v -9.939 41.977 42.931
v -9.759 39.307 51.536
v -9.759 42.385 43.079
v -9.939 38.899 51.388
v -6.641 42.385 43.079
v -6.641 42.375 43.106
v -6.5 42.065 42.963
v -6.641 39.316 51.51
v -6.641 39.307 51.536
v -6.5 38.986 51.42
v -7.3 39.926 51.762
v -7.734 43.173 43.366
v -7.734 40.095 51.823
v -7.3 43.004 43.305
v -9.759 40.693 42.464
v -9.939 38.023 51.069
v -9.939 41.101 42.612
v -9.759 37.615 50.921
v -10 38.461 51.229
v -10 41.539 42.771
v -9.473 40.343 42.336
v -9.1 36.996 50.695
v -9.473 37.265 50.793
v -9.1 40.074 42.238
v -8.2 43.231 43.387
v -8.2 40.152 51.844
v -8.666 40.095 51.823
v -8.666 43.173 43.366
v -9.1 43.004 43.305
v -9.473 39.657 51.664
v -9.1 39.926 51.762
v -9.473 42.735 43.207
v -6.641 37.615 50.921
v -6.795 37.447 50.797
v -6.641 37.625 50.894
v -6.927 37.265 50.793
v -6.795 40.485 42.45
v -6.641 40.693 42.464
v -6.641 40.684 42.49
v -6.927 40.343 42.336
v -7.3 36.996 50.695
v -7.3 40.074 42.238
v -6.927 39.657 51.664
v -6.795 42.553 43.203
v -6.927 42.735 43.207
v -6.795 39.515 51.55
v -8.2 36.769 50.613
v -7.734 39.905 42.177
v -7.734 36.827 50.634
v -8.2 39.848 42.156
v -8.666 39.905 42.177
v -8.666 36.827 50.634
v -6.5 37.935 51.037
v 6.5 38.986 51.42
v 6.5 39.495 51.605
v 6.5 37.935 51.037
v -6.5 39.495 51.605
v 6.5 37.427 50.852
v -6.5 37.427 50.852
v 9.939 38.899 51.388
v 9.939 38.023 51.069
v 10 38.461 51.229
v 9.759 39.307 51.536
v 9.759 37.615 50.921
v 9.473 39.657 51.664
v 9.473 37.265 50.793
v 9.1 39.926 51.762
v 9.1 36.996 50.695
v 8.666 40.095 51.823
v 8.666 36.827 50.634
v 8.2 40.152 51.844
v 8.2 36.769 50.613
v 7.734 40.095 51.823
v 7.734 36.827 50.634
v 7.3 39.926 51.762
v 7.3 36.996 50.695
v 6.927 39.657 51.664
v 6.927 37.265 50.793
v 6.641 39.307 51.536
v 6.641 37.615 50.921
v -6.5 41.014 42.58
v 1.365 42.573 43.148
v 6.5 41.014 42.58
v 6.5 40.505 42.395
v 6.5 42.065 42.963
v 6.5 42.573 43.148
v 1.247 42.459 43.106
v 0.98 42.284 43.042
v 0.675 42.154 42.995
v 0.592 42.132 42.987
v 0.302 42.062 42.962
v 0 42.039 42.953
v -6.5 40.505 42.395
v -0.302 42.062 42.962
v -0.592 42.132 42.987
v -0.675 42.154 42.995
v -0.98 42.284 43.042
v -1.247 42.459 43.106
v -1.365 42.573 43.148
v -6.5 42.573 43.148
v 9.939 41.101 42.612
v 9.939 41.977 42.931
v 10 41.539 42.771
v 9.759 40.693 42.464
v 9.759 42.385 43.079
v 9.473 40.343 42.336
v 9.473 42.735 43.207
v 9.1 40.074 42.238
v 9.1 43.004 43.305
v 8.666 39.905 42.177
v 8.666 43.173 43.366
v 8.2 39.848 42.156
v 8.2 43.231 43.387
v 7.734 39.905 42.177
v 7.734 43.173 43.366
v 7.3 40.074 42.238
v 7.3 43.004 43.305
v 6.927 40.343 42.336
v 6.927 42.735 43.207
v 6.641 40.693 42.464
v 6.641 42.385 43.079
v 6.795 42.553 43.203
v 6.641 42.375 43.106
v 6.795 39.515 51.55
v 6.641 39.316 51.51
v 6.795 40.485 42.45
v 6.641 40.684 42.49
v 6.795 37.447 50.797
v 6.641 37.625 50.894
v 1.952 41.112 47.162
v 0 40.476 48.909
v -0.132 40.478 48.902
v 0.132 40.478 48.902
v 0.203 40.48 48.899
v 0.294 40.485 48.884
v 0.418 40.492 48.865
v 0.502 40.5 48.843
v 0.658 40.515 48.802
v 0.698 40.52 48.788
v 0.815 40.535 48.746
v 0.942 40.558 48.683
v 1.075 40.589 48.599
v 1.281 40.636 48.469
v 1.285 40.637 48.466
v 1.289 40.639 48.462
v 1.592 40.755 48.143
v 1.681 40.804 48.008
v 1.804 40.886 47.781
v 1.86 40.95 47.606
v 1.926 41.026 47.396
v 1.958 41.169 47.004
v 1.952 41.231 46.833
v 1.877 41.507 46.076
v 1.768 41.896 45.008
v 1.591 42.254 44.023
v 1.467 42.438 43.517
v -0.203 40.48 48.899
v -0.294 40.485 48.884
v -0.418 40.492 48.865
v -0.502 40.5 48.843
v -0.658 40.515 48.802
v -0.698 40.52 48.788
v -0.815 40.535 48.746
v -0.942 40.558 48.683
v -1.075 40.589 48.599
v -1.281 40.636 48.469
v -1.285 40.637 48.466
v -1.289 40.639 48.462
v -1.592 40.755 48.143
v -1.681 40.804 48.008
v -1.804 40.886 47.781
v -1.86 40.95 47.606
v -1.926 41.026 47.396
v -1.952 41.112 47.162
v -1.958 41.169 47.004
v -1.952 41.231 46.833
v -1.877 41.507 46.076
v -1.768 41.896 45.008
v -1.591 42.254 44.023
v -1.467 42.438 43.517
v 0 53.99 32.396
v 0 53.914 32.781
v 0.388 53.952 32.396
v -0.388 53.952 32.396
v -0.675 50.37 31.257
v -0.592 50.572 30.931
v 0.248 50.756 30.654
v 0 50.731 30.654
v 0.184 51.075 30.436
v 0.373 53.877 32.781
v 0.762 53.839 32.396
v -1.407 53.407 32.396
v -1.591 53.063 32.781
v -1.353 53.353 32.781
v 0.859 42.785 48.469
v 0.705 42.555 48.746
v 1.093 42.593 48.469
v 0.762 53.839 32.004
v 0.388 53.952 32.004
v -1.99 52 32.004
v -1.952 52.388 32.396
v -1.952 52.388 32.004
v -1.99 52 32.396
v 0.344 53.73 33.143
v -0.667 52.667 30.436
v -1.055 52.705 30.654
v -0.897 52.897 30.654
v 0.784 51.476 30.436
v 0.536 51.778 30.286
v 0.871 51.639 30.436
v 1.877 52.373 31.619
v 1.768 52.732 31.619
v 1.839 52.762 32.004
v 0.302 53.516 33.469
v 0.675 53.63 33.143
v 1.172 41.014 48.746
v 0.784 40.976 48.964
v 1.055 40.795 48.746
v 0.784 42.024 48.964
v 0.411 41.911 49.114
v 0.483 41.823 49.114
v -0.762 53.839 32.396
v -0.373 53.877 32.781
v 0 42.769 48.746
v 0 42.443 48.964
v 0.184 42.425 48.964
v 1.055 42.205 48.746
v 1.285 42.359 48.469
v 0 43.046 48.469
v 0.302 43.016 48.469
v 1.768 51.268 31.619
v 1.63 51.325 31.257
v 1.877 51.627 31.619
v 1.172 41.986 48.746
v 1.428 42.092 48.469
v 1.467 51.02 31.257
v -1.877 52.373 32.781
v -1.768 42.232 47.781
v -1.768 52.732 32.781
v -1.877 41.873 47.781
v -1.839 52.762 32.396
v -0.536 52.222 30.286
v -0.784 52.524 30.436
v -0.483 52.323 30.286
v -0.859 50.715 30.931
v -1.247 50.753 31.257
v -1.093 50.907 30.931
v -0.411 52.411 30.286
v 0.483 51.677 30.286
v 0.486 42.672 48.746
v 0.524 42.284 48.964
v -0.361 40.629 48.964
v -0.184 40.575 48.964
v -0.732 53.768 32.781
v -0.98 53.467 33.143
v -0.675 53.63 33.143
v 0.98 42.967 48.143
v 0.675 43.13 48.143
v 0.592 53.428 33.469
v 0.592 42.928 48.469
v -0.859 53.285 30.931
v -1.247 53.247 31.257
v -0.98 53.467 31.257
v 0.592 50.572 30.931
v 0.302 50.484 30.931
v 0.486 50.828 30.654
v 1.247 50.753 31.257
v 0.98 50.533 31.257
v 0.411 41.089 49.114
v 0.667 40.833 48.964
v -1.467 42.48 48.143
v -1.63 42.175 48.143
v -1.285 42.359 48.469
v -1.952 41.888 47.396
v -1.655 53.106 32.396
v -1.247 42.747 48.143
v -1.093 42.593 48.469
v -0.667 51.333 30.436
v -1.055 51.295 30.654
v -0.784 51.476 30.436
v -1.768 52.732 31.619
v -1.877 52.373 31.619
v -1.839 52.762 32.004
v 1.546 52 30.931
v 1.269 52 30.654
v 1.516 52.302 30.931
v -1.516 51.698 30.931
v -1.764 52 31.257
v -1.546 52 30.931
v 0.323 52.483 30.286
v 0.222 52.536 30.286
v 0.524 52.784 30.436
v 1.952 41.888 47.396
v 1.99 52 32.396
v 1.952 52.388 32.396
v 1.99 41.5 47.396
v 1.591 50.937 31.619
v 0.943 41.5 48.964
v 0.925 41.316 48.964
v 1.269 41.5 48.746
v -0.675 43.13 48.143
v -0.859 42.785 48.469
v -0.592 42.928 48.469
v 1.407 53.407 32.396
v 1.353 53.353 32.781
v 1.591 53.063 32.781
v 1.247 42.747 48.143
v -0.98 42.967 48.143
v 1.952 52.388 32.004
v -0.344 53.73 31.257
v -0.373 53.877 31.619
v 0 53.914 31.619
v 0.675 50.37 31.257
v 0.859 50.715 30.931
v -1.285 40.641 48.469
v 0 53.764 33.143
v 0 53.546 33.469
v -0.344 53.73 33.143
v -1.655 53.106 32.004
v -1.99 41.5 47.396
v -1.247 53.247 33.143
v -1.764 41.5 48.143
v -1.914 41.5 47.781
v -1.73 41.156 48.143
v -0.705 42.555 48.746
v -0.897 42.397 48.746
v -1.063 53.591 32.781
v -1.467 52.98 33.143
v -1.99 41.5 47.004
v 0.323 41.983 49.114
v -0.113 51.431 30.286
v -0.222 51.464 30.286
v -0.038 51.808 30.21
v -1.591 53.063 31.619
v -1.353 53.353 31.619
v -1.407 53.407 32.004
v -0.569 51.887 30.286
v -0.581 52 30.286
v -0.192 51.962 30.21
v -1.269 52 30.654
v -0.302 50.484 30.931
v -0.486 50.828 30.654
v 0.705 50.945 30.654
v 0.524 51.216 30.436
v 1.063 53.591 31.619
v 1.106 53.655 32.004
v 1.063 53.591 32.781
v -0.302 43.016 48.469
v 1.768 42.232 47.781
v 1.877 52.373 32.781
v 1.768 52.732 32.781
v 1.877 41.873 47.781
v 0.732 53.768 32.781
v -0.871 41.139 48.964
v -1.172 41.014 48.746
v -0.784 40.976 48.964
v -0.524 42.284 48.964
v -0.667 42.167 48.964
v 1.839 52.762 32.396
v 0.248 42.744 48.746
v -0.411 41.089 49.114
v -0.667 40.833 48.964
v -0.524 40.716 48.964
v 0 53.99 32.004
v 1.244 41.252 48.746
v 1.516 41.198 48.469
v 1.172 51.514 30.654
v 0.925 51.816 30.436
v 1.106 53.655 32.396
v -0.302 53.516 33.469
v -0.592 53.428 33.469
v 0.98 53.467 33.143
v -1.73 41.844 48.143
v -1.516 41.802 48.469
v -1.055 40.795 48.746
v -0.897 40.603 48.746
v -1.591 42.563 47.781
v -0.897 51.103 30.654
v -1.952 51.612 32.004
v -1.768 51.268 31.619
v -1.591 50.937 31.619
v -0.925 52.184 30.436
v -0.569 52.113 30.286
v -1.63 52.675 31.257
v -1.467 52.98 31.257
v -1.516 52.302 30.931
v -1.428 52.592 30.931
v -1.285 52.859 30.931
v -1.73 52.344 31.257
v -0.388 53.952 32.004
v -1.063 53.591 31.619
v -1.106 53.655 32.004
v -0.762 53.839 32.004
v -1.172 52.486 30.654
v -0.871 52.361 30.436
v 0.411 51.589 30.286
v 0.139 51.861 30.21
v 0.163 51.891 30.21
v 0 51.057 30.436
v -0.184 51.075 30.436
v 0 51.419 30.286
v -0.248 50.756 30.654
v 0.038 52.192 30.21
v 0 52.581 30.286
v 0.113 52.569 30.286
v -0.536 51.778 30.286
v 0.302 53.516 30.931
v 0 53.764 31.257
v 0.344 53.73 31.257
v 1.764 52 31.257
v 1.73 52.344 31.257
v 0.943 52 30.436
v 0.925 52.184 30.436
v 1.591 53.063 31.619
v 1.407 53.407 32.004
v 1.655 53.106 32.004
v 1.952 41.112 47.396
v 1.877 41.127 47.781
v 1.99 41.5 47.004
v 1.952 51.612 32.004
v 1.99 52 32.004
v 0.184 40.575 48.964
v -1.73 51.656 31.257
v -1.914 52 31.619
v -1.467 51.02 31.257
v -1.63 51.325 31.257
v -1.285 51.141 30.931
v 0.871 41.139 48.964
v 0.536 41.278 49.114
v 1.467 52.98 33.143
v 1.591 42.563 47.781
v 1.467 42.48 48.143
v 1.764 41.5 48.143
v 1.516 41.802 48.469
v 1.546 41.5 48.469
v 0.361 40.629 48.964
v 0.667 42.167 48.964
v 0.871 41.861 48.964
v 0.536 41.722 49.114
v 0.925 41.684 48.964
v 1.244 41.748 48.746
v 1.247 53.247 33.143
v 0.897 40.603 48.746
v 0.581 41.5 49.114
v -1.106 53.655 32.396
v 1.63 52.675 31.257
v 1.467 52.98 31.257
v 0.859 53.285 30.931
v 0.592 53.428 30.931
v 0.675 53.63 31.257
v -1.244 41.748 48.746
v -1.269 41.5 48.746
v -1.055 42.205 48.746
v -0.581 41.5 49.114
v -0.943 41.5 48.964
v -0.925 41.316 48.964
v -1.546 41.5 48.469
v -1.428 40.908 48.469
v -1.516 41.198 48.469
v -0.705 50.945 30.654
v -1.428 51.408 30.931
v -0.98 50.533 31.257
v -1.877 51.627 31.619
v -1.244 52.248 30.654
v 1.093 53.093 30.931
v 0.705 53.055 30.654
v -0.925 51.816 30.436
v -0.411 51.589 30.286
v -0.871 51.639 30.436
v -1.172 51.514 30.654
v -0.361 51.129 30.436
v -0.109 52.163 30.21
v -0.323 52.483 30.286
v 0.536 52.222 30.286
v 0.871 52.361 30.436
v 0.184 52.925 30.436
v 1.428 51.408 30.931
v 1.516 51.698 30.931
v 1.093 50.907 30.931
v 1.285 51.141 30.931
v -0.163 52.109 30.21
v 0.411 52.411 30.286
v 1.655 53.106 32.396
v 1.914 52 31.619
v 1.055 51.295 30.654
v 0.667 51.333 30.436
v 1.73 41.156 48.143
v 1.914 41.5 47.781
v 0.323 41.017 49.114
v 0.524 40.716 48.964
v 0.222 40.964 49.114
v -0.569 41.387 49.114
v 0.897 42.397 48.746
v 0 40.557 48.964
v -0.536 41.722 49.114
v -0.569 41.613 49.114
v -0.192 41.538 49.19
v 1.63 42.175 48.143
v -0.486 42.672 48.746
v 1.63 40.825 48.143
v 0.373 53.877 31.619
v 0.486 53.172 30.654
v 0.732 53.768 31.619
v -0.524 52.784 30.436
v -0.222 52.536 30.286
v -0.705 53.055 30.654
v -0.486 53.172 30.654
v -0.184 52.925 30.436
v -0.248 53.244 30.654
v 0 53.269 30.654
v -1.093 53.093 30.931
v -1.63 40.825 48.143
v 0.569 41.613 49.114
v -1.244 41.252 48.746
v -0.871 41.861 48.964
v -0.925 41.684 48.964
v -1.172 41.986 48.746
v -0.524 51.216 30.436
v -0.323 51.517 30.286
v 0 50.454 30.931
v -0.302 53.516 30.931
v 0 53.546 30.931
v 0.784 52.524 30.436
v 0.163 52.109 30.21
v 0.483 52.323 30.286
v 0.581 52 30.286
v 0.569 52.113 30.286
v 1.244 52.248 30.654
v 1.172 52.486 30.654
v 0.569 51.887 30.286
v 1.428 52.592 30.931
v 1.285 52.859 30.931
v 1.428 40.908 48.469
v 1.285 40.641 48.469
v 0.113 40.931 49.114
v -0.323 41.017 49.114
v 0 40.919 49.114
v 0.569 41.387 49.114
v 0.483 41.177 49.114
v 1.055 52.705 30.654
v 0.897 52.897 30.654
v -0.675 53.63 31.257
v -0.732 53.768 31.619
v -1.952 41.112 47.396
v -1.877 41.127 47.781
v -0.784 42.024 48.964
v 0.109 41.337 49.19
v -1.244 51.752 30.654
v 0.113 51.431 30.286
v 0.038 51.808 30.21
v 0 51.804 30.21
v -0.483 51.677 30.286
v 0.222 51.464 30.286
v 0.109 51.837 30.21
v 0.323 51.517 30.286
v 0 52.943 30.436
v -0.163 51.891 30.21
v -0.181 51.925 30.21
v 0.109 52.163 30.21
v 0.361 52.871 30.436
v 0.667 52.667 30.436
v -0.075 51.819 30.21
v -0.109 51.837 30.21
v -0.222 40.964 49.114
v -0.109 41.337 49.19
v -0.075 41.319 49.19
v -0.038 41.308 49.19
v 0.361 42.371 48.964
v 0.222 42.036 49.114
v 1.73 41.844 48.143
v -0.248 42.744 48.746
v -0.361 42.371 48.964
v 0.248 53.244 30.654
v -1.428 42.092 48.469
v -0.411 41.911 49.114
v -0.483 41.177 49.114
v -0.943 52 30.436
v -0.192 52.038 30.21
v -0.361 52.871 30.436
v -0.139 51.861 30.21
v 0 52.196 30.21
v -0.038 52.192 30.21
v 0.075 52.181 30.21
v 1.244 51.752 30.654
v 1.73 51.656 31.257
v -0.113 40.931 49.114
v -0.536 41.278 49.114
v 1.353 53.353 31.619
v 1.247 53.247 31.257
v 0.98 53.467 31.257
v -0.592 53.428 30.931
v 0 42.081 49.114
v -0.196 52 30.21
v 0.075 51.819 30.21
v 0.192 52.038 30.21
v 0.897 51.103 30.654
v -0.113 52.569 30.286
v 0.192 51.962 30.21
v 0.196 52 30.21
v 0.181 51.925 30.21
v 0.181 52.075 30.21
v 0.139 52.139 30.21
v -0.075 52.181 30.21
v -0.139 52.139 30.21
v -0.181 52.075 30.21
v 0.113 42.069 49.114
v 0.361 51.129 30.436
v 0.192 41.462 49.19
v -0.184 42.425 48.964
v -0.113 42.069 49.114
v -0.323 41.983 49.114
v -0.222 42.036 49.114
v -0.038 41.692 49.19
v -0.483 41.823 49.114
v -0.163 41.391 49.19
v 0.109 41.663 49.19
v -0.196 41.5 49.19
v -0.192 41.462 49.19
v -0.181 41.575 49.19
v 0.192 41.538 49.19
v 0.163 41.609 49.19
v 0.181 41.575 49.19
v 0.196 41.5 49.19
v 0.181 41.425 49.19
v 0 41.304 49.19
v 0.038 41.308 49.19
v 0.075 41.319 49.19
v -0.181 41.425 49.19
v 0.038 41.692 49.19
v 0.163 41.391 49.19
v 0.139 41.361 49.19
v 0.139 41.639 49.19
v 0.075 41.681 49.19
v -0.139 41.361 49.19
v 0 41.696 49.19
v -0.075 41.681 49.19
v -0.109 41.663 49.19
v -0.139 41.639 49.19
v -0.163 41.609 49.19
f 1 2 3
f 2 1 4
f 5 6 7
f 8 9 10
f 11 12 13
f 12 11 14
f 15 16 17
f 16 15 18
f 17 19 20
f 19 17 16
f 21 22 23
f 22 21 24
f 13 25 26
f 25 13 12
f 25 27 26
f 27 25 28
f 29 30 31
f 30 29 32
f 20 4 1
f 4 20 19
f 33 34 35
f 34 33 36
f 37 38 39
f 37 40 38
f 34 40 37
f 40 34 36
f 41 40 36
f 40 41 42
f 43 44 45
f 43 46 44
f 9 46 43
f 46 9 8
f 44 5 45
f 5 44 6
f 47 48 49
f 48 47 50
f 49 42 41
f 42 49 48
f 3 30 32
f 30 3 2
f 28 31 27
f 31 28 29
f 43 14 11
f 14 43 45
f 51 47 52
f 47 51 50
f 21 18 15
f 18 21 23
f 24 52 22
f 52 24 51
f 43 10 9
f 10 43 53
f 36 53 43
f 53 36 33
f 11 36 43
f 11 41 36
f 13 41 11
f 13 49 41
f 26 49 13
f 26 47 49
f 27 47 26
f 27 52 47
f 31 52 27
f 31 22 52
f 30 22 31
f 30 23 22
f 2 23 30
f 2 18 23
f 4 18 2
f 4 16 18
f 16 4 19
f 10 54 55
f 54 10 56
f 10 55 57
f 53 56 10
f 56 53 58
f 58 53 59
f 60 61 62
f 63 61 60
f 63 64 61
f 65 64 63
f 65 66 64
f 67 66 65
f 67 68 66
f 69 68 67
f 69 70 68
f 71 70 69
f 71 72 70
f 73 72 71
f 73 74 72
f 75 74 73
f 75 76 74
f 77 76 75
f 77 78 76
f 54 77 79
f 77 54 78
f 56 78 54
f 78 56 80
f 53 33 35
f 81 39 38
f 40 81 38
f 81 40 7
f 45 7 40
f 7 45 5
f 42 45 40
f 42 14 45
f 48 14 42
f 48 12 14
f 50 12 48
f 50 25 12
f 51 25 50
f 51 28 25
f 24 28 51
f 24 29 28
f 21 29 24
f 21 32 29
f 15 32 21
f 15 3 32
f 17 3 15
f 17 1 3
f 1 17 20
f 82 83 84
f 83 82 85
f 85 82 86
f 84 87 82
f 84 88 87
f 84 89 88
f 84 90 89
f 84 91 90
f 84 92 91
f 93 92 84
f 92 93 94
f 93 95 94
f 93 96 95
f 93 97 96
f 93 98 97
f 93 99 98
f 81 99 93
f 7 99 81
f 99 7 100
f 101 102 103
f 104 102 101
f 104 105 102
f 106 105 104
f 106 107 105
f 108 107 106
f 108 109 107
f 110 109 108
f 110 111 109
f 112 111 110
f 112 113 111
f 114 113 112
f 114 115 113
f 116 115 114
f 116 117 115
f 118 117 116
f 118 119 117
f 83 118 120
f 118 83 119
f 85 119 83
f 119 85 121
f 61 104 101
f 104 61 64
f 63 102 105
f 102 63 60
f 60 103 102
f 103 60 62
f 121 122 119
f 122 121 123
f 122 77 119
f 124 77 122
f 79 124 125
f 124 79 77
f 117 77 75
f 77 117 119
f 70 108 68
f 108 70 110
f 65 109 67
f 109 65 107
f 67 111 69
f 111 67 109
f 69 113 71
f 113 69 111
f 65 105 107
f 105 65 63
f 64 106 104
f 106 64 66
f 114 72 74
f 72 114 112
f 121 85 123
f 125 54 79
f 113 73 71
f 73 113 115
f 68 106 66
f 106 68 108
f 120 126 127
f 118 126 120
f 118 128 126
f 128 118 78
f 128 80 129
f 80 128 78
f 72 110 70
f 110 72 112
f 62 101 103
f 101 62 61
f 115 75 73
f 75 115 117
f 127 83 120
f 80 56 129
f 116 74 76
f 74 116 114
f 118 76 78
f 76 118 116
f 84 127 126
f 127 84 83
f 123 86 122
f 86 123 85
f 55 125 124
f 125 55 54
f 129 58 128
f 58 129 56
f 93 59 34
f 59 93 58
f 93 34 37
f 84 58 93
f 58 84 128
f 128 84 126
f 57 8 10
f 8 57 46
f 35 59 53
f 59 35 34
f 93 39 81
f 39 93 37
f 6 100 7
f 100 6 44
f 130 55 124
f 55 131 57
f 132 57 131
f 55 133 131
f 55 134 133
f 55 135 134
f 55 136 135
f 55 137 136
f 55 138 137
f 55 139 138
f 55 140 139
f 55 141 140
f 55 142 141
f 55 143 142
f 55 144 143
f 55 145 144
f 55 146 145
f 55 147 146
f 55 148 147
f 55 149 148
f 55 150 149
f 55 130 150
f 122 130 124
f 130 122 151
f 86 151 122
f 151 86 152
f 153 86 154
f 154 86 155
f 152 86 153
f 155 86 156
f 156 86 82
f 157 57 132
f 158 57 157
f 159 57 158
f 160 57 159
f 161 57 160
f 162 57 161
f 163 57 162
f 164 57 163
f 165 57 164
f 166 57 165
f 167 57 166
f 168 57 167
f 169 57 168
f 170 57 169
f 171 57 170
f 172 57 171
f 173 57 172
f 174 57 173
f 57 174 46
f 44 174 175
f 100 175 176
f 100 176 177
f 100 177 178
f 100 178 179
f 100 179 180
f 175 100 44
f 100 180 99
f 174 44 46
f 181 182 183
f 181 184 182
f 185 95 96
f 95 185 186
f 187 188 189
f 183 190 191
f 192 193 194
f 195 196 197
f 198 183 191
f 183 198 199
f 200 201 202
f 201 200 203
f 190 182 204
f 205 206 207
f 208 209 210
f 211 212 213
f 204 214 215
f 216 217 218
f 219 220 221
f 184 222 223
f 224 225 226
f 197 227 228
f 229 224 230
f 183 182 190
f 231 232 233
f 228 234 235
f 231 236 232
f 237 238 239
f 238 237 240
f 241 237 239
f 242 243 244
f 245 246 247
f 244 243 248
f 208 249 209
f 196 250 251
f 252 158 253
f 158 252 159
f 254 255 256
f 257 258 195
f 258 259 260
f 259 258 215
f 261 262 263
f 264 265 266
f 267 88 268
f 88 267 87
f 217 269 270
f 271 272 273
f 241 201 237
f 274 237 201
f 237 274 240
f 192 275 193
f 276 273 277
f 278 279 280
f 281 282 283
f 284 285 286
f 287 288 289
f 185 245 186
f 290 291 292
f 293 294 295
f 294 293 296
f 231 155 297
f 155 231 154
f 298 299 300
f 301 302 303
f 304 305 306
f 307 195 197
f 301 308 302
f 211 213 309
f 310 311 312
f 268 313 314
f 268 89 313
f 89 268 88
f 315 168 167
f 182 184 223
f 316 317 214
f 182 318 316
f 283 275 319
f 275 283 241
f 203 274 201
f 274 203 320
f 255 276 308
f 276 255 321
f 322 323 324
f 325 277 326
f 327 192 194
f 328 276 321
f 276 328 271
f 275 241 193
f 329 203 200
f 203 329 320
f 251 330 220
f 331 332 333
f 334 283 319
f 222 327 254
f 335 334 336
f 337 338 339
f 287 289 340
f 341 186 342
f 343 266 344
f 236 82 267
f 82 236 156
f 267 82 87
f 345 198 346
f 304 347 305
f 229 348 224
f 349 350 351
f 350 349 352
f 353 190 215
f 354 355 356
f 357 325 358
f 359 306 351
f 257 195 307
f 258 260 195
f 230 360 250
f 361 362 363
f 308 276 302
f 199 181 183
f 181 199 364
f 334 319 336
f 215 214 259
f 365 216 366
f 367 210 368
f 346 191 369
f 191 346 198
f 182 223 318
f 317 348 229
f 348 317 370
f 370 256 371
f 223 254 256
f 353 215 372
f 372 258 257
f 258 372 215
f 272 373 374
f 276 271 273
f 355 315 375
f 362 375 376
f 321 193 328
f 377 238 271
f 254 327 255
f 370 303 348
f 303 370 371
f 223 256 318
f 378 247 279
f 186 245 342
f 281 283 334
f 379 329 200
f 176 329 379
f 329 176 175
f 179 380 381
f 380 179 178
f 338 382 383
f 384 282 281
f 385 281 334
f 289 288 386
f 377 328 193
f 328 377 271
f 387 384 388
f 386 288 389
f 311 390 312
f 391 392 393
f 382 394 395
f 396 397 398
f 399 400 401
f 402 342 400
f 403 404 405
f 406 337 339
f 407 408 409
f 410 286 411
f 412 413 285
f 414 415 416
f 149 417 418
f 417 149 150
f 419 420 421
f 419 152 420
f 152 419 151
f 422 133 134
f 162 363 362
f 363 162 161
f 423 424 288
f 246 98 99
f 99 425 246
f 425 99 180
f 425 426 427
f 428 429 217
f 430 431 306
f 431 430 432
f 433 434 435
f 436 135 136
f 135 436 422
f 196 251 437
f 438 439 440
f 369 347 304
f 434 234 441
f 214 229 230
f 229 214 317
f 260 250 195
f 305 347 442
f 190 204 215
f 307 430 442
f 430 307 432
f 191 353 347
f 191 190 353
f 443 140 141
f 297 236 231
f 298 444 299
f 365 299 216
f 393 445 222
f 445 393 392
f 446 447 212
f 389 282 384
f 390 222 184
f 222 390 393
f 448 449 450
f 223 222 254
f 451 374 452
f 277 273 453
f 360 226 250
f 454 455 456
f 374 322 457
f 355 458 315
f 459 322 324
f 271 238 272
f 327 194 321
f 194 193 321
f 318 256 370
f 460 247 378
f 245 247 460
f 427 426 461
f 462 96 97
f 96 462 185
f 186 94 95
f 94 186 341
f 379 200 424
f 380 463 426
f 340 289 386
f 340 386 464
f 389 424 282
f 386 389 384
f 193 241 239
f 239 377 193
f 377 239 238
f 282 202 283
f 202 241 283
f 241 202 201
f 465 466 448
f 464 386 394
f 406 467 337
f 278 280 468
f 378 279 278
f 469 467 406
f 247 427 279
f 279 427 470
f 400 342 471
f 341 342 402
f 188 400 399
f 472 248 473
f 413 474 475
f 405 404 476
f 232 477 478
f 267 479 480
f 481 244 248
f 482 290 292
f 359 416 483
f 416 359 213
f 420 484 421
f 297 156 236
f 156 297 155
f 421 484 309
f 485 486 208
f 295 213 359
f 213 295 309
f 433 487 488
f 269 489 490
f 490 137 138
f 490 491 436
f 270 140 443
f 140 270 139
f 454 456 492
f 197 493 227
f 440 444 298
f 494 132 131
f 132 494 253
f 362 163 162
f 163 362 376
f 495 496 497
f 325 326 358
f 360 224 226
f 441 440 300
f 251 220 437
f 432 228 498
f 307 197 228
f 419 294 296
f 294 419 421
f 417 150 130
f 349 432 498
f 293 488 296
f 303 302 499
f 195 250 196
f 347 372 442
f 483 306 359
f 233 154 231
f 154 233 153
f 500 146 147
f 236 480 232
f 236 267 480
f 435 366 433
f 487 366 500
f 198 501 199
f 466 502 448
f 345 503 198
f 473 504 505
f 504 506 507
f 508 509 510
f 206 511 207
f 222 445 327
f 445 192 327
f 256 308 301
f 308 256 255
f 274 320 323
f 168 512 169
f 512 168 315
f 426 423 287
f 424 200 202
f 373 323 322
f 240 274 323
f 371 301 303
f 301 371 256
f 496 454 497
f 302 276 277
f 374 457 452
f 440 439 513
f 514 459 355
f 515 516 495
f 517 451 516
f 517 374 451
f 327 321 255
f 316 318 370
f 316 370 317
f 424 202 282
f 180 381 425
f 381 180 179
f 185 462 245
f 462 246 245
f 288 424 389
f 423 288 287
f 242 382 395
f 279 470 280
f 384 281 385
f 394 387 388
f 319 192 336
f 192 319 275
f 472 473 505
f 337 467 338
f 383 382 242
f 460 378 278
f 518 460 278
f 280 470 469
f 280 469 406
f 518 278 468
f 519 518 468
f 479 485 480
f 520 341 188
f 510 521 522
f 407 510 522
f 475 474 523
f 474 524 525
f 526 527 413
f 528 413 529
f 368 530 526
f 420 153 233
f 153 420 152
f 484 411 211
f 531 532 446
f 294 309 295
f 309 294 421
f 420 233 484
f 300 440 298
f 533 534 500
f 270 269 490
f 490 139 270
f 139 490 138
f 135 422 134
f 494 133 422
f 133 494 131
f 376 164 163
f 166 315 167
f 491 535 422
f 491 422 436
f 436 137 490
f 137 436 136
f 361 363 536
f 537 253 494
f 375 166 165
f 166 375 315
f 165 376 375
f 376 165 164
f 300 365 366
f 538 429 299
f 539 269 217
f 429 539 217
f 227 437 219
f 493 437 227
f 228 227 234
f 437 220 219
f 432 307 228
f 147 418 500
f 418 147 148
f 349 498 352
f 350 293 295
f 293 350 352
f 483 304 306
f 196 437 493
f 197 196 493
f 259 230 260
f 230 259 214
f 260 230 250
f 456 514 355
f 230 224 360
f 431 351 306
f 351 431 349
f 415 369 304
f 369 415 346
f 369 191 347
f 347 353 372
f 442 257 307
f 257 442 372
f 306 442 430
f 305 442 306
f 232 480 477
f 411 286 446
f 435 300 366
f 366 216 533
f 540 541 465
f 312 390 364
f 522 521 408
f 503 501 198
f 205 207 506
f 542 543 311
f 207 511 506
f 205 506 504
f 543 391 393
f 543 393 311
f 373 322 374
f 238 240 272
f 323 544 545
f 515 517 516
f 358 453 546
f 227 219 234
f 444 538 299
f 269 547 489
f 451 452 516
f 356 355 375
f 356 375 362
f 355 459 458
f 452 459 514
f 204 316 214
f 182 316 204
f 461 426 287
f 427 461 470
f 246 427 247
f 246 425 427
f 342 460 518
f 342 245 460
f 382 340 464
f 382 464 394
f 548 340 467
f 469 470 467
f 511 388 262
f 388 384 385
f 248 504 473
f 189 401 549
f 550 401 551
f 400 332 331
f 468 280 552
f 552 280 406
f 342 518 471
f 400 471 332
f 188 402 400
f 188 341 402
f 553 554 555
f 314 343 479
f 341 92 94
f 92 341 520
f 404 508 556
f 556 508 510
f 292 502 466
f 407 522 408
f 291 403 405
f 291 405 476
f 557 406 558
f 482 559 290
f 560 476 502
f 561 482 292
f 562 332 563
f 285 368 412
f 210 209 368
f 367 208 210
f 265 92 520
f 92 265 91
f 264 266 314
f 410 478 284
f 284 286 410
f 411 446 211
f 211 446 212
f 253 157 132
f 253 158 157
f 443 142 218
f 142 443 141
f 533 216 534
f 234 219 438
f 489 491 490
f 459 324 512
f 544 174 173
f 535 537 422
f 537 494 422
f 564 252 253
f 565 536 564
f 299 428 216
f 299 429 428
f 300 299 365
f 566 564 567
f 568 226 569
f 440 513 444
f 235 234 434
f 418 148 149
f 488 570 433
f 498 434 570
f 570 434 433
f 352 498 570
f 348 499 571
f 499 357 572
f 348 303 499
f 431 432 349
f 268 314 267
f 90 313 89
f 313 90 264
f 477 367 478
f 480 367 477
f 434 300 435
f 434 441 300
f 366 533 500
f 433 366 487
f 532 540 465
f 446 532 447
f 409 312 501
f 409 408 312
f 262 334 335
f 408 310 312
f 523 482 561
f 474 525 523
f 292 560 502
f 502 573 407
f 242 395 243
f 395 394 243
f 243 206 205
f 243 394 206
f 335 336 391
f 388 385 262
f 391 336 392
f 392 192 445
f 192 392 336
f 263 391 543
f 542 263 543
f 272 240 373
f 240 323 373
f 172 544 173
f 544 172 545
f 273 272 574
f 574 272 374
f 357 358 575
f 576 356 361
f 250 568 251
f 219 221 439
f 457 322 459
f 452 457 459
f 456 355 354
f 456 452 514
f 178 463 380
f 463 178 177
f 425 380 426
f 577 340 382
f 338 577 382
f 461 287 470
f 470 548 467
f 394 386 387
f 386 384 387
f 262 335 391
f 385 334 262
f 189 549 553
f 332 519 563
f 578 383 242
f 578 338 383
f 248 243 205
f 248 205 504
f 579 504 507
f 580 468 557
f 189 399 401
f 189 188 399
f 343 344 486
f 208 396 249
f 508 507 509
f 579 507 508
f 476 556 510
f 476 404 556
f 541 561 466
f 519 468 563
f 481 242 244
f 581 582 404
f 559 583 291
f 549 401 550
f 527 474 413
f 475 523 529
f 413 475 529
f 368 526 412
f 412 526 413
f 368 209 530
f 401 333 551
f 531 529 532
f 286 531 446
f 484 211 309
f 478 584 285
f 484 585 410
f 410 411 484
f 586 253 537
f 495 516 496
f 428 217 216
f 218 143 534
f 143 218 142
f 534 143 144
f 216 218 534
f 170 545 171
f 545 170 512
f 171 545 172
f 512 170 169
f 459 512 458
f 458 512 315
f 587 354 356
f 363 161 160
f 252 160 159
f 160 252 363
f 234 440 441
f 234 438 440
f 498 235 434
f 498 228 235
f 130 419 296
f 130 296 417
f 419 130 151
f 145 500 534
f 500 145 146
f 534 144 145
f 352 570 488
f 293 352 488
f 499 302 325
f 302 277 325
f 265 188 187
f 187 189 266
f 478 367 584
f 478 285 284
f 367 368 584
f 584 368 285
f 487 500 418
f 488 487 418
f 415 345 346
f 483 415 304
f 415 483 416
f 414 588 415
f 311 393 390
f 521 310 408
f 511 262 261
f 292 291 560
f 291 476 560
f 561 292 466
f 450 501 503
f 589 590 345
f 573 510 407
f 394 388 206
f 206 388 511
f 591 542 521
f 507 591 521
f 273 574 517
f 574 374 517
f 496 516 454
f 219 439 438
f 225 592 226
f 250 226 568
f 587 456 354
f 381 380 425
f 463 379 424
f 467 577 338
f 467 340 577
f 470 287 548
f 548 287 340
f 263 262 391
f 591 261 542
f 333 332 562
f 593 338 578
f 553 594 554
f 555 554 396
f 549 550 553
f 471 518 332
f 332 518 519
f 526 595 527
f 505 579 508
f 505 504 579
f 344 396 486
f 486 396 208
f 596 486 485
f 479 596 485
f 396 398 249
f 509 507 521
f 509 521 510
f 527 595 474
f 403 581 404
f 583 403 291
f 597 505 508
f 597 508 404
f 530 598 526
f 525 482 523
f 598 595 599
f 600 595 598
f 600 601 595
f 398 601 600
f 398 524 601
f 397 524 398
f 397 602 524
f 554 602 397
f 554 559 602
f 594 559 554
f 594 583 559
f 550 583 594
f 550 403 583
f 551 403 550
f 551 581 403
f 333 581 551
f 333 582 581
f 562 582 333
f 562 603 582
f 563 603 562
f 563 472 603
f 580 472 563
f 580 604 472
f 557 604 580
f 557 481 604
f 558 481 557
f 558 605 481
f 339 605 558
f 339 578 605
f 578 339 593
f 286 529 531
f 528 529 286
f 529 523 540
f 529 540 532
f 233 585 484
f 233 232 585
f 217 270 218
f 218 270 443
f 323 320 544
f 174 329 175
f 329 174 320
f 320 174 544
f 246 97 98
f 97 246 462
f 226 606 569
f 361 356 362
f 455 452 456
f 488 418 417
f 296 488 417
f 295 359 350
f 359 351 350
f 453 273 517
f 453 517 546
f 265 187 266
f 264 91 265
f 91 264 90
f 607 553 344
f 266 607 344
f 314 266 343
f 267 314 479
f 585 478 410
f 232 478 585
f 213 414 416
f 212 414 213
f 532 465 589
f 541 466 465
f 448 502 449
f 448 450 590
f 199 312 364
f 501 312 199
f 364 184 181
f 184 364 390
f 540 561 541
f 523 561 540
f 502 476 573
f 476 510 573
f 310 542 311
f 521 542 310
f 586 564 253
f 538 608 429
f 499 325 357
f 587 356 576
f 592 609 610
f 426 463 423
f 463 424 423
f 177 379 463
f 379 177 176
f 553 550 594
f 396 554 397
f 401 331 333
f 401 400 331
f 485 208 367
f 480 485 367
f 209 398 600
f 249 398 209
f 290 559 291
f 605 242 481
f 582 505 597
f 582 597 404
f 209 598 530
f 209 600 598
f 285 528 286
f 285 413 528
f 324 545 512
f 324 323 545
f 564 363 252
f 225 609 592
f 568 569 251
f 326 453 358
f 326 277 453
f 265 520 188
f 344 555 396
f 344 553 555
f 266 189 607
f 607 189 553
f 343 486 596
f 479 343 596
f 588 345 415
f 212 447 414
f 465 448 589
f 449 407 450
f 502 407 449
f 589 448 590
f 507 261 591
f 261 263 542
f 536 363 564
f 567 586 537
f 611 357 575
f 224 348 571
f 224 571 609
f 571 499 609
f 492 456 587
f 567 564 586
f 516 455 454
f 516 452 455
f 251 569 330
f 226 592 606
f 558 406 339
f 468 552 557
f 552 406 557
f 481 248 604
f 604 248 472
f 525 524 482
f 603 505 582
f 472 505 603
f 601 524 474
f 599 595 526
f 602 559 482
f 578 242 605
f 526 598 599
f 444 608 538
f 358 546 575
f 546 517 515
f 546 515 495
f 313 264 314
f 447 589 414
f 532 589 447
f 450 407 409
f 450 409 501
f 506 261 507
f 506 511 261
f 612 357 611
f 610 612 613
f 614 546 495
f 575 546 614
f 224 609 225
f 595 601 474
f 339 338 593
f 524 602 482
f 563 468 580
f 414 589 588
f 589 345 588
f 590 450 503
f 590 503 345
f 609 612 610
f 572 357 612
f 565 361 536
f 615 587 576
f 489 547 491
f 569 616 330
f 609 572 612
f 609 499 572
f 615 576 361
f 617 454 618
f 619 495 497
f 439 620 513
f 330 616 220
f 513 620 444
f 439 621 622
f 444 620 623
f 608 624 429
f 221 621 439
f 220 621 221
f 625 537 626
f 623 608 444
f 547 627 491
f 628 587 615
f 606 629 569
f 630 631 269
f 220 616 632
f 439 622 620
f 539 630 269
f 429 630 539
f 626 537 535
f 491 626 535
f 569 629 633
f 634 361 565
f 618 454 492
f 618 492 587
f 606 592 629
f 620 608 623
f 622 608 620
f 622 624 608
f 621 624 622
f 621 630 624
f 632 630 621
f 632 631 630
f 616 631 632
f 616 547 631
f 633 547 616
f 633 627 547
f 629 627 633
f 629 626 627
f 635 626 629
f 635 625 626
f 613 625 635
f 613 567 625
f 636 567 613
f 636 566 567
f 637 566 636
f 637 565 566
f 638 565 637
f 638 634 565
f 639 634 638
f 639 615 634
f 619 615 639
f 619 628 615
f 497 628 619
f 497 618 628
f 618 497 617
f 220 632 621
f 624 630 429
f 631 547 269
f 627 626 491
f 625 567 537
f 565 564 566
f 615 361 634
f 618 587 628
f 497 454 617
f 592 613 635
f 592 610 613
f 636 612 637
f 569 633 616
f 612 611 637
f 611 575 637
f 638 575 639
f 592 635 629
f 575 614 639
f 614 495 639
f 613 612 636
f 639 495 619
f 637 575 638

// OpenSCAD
// file: ../lib.scad
// ===== 공용 프리미티브 (params 의존 없음 — use로 포함. 함정 1) =====

// 두 점을 잇는 캡슐. 끝단이 od/2 만큼 뻗는다 (함정 3)
module rod(p1, p2, od, fn = 56)
    hull() { translate(p1) sphere(d = od, $fn = fn);
             translate(p2) sphere(d = od, $fn = fn); }

function mir(p, s = 1) = [s * p.x, p.y, p.z];

// --- 라운디드 사각 2D 폴리곤 (CCW) ---
function arc_pt(cx, cy, r, a) = [cx + r * cos(a), cy + r * sin(a)];
function rrpts(w, h, r, n = 4) =
    let (x = w / 2 - r, y = h / 2 - r)
    concat(
        [for (i = [0:n]) arc_pt( x, -y, r, -90 + 90 * i / n)],
        [for (i = [0:n]) arc_pt( x,  y, r,   0 + 90 * i / n)],
        [for (i = [0:n]) arc_pt(-x,  y, r,  90 + 90 * i / n)],
        [for (i = [0:n]) arc_pt(-x, -y, r, 180 + 90 * i / n)]);

// y 위치의 XZ 단면 슬래브 (중심 x0/zc, 폭 w/높이 h, 모서리 r).
// 회전 매핑: 2D x→차량 X, 2D y→차량 Z, 돌출 +z→−Y (y..y+0.02 전방 전용, 함정 20)
module slabr(y, x0, w, h, zc, r)
    translate([x0, y + 0.02, zc]) rotate([90, 0, 0])
        linear_extrude(0.02) polygon(rrpts(w, h, r));

// 단면 체인 loft: sec = [[y, x0, w, h, zc, r], ...]
module loftr(sec)
    for (i = [0 : len(sec) - 2])
        hull() {
            slabr(sec[i][0],     sec[i][1],     sec[i][2],     sec[i][3],     sec[i][4],     sec[i][5]);
            slabr(sec[i + 1][0], sec[i + 1][1], sec[i + 1][2], sec[i + 1][3], sec[i + 1][4], sec[i + 1][5]);
        }

// 라운디드 박스 (z0..z1 수직, 평면 모서리 r)
module rbox(xc, yc, z0, z1, dx, dy, r, fn = 32)
    hull() for (px = [-1, 1], py = [-1, 1])
        translate([xc + px * (dx / 2 - r), yc + py * (dy / 2 - r), z0])
            cylinder(r = r, h = z1 - z0, $fn = fn);

// --- NACA 계열 에어포일 (LE 원점, 2D +x = 현 방향) ---
function _yt(x, c, t) = 5 * t * c * (0.2969*sqrt(x) - 0.1260*x - 0.3516*x*x
    + 0.2843*x*x*x - 0.1036*x*x*x*x);
function _yc(x, c, m) = 4 * m * c * x * (1 - x);
function naca_pts(c, t, m, n = 12) =
    concat(
        [for (i = [0:n])     let (x = i / n)     [x*c,  _yt(x, c, t) + _yc(x, c, m)]],
        [for (i = [n-1:-1:0]) let (x = i / n)    [x*c, -_yt(x, c, t) + _yc(x, c, m)]]);

// 슬라이스 3D 링: v=[x, yle, zle, c, aoa, th, cam] → 받각 회전된 naca 점의 링
// (th/cam은 mm — 현 대비 비율로 정규화)
function wring(v, n = 12) =
    let (c = v[3], t = v[5] / c, m = v[6] / c, pts = naca_pts(c, t, m, n),
         ca = cos(v[4]), sa = sin(v[4]))
    // 코드 방향 (ca,sa) + 두께/캠버 수직 방향 (-sa,ca) — 2D y 누락 금지
    [for (p = pts) [v[0], v[1] + p[0] * ca - p[1] * sa, v[2] + p[0] * sa + p[1] * ca]];

// 진짜 로프트 윙 — polyhedron 스트립. hull 체인은 캠버진 하면을 볼록 껍질로
// 채워(LE→TE 직선 웨지) 요소가 처지므로 쓰지 않는다
module wing3(sl, n = 12) {
    rings = [for (v = sl) wring(v, n)];
    ns = len(rings);
    m = len(rings[0]);
    pts = [for (r = rings, p = r) p];
    function ix(i, k) = i * m + (k % m);
    faces = concat(
        // 측면 스트립 (사중면 → 삼각형 2) — 외향 노멀 권선(캡과 일치)
        [for (i = [0 : ns - 2], k = [0 : m - 1])
            each [[ix(i, k), ix(i, k + 1), ix(i + 1, k + 1)],
                  [ix(i, k), ix(i + 1, k + 1), ix(i + 1, k)]]],
        // 끝 캡 (링은 단순 폴리곤 — 팬 삼각분할)
        [for (k = [1 : m - 2]) [ix(0, 0), ix(0, k + 1), ix(0, k)]],
        [for (k = [1 : m - 2]) [ix(ns - 1, 0), ix(ns - 1, k), ix(ns - 1, k + 1)]]
    );
    polyhedron(points = pts, faces = faces, convexity = 4);
}

// 반쪽 슬라이스 → x-대칭 전체. 규약: half는 센터(x=0)→팁 순서(내림차순 x).
// 결과는 x 오름차순 체인. x=0 센터만 중복 제외 (그 외 전부 미러)
function wsym(half) =
    concat([for (i = [len(half) - 1 : -1 : 0]) half[i]],
           [for (i = [0 : len(half) - 1]) if (abs(half[i][0]) > 1e-9)
               concat([-half[i][0]], [for (j = [1 : len(half[i]) - 1]) half[i][j]])]);

// 환(링), 축 Z
module ann(r_in, r_out, h, fn = 96)
    difference() { cylinder(r = r_out, h = h, center = true, $fn = fn);
                   cylinder(r = r_in,  h = h + 2, center = true, $fn = fn); }

// 리스트 전체 x반전+순서 역행 (센터 구간 없는 플랩 등 — 좌우 별도 wing3 호출용).
// x반전만 하면 행렬식이 음수가 되어 권선이 뒤집힌다 → 순서 역행으로 상쇄
function msym(half) =
    [for (i = [len(half) - 1 : -1 : 0])
        concat([-half[i][0]], [for (j = [1 : len(half[i]) - 1]) half[i][j]])];
// file: ../params.scad
// =====================================================================
// F1 그랜드파이언스 카 1:10 — 전체 파라미터 (유일한 수정 지점)
// 좌표계: +Y 전방, +X 좌측, +Z 상방, 지면 z=0, 원점=휠베이스 중심
// 전장 558 (y -268..+278), 전폭 194, 휠베이스 360, 타이어 OD 72 (720mm)
// 30부품. loftr 단면 = [y, x0, w, h, zc, r] (XZ 단면, y..y+0.02 슬래브)
// wing3 슬라이스 = [x, yle, zle, c, aoa, th, cam]
//   aoa: 현 방향의 X축 회전각. 전방 받각 요소는 165~170 (TE가 뒤+위)
// =====================================================================
$fn = 96;

// -- 휠/액슬 (실차 720mm 타이어, 18인치 림, 트랙 F1600/R1550) --
AXF_Y = 180;   AXR_Y = -180;
WHF_X = 80;    WHR_X = 77.5;
WH_Z  = 36;
TIRF_W = 30.5; TIRR_W = 40.5;  TIR_R = 36;
TIR_FN = 288;                 // 타이어 회전체 해상도
RIM_R = 23.2;  RIM_T = 1.0;   // 림 배럴 반경/두께
RIM_LF = 12.4; RIM_LR = 17.4; // 림 배럴 반폭
HUB_BORE = 7.0; STUB_D = 6.2; // 방사 간극 0.4
DISC_R = 15.5;                // 브레이크 디스크

// -- 바디 공통 레벨 --
FLO_Z0 = 2.0;  FLO_Z1 = 5.5;  // 플로어 (두께 3.5)
BOD_Z0 = 5.65;                // 샤시/카버/기어박스 바닥 (플로어 위 0.15)
J = 0.15;                     // 부품 접합 기본 간극
ARM_OD = 3.4;                 // 서스펜션 암 캡슐 직경

// ===== 01 플로어 =====
FLOOR_SEC = [
    [132,    0,  92, 3.5, 3.75, 1.5], [100, 0, 118, 3.5, 3.75, 1.5],
    [60,     0, 130, 3.5, 3.75, 2.0], [10,  0, 132, 3.5, 3.75, 2.0],
    [-60,    0, 128, 3.5, 3.75, 2.0], [-120, 0, 112, 3.5, 3.75, 2.0],
    [-161.85, 0, 100, 3.5, 3.75, 2.0]];

// ===== 02 디퓨저 (램프 + 스트레이크는 부품 내부) =====
DIFF_SEC = [
    [-230,   0, 100, 10.0, 11.0, 1.5], [-215, 0, 100, 8.0,  9.0, 1.5],
    [-190,   0, 100,  6.0,  6.2, 1.5], [-162.0, 0, 100, 4.0, 4.15, 1.5]];
DIFF_TOP = [[-175, 7.8], [-205, 11.9], [-228, 15.6]];  // (y, 램프 상면 z)

// ===== 03 플로어 에지 윙 =====
FEW_SEC = [   // [y, x0, w, h, zc, r] — x0 부호로 좌우
    [55,   63.5, 3.0, 2.0, 6.65, 1.0], [-5,  65.5, 3.0, 5.5, 8.40, 1.5],
    [-70,  63.0, 3.0, 4.0, 7.65, 1.5], [-120, 58.0, 3.0, 3.0, 7.15, 1.5]];
FEW2_SEC = [
    [100, 57.0, 2.5, 1.5, 6.40, 0.8], [60, 60.0, 2.5, 2.0, 6.65, 0.8]];

// ===== 04 노우즈 =====
NOSE_SEC = [
    [95,   0, 38, 28, 25.3, 12], [100,  0, 38, 29, 25.3, 12],
    [115,  0, 36, 28, 23.8, 11], [135,  0, 31, 24, 21.3,  9],
    [160,  0, 27, 20, 18.3,  8], [185,  0, 23, 17, 15.8,  7],
    [205,  0, 20, 15, 14.3,  6], [224,  0, 17, 12, 12.3,  5],
    [242,  0, 14,  9, 10.8,  4], [258,  0, 10,  7, 10.1,  3],
    [272,  0,  4.5, 4.5, 9.8, 2], [273.5, 0, 1.2, 1.2, 9.8, 0.6]];

// ===== 05 샤시(모노코크) + 콕핏 컷 =====
CHAS_SEC = [
    [-34.85, 0, 46, 44, 27.65, 15], [-10, 0, 48, 46, 28.65, 15],
    [20,     0, 48, 44, 27.65, 15], [60,  0, 46, 40, 25.65, 14],
    [94.85,  0, 42, 34, 22.65, 12]];
CKP_CUT = [[62, 0, 34, 32, 46, 3], [-30, 0, 34, 30, 45, 3]];

// ===== 06 엔진 커버 + 샤크핀 =====
COV_SEC = [
    [-152,   0,  8, 14, 35.65,  6], [-140, 0, 12, 18, 32.65,  7],
    [-120,   0, 18, 24, 29.65,  9], [-95,  0, 26, 30, 26.15, 11],
    [-70,    0, 34, 36, 25.65, 13], [-50,  0, 40, 40, 25.65, 14],
    [-35.15, 0, 44, 42, 26.65, 15]];
FIN_SEC = [
    [-162, 0, 2.2, 44, 62.0, 1], [-120, 0, 2.5, 30, 56.0, 1],
    [-92.2, 0, 2.5, 10, 45.0, 1]];

// ===== 07 에어박스 (험프 + 인테이크 링) =====
ABX_SEC = [
    [-92, 0, 14, 17, 50.00, 6], [-68, 0, 20, 24, 56.60, 8],
    [-46, 0, 22, 26, 59.60, 8], [-34, 0, 22, 13, 56.30, 6]];
ABX_RING_C = [0, -45, 73.5];  ABX_RING_R = 11;  ABX_RING_T = 4.5;
ABX_RING_SZ = 0.72;

// ===== 08 사이드포드 (x0=±41.5) =====
SPOD_X0 = 41.5;
SPOD_SEC = [   // [y, w, h, zc, r]
    [38,   34, 26, 18.65, 8], [5,   34, 28, 19.65, 9], [-25,  34, 26, 18.65, 9],
    [-55,  32, 21, 18.15, 8], [-80, 30, 15, 17.15, 8], [-100, 26,  9, 16.15, 7]];
SPOD_INLET = [24, 18, 19, 2.3];  // 컷: w, h, zc, 깊이

// ===== 09 할로 =====
HALO_N = 28;  HALO_OD = 9;
HALO_RX = 22; HALO_RY = 44; HALO_CY = 12;  // 타원 계획면(평면도)
HALO_Z0 = 75; HALO_ZA = 2;                 // z(t) = Z0 + ZA*cos(t)

// ===== 10/11/12/13 프런트 윙 =====
FW_MAIN_HALF = [   // 반쪽(x≤0) — wsym()로 전체화
    [0,    258.3, 2.4, 20, 170, 1.4, 2.0],
    [-16,  259.0, 3.4, 27, 165, 1.6, 2.4],
    [-40,  260.0, 3.6, 40, 166, 1.8, 2.8],
    [-60,  257.0, 4.0, 37, 167, 1.7, 2.6],
    [-80,  258.0, 4.4, 31, 166, 1.6, 2.2],
    [-95.2, 263.0, 4.6, 26, 166, 1.5, 1.8]];
FW_F1_HALF = [
    [-16,  253.0, 8.0, 22, 155, 1.3, 4.0],
    [-40,  250.5, 8.2, 26, 156, 1.4, 4.2],
    [-60,  249.5, 8.4, 26, 157, 1.4, 4.2],
    [-80,  250.0, 8.6, 24, 158, 1.4, 4.0],
    [-95.2, 254.0, 8.8, 21, 158, 1.3, 3.5]];
FW_F2_HALF = [
    [-16,  258.0, 12.4, 17, 147, 1.2, 4.5],
    [-40,  255.5, 12.6, 20, 148, 1.3, 4.8],
    [-60,  254.5, 12.8, 20, 149, 1.3, 4.8],
    [-80,  254.5, 13.0, 19, 150, 1.3, 4.5],
    [-95.2, 258.0, 13.2, 17, 150, 1.2, 4.0]];
FW_EP_X = 96.3;  FW_EP_T = 1.5;   // 엔드플레이트 x 중심/두께
FW_EP_PTS = [    // (y,z) 아웃라인
    [226, 1.5], [266, 1.5], [266, 8], [263, 24.5], [252, 24.5],
    [244, 17], [233, 15], [226, 9]];
FW_MT_SEC = [   // 마운트 플레이트 [y, x0(±2.6), w, h, zc, r] — 노우즈 저면 라운딩 회피
    [244, 2.6, 1.6, 1.8, 5.25, 0.5], [250, 2.6, 1.6, 1.8, 5.25, 0.5]];

// ===== 14 리어 윙 =====
RW_MAIN = [
    [-50.8, -212, 57.5, 46, 162, 2.2, -3.5], [-25, -211, 56.6, 47, 162, 2.3, -4.0],
    [0,     -210, 54.2, 47, 162, 2.3, -4.0], [25,  -211, 56.6, 47, 162, 2.3, -4.0],
    [50.8,  -212, 57.5, 46, 162, 2.2, -3.5]];
RW_FLAP = [
    [-49.6, -234,   71.8, 30, 155, 1.8, -4.5],
    [0,     -235.5, 73.0, 30, 155, 1.8, -4.5],
    [49.6,  -234,   71.8, 30, 155, 1.8, -4.5]];
RW_EP_X = 52;  RW_EP_T = 2;
RW_EP_PTS = [
    [-200, 46], [-268, 46], [-268, 60], [-262, 93], [-250, 93],
    [-243, 72], [-218, 64], [-202, 74]];
RW_DRS = [-245, 79.4, 5.0, 2.6, 3.0];   // 팟: y, z, w, h, 두께

// ===== 15 빔 윙 =====
BEAM_E1 = [
    [-50.9, -204.5, 31.5, 16, 162, 1.8, -2.5], [0, -205.5, 30.4, 16, 162, 1.8, -2.5],
    [50.9,  -204.5, 31.5, 16, 162, 1.8, -2.5]];
BEAM_E2 = [
    [-50.9, -210, 36.8, 15, 158, 1.6, -3.0], [0, -211, 35.6, 15, 158, 1.6, -3.0],
    [50.9,  -210, 36.8, 15, 158, 1.6, -3.0]];
BEAM_PLATE = [-214, -200.15, 8.2, 22, 31];  // 마운트 플레이트 y1,y0,x반폭,z0,z1

// ===== 16 리어윙 파일론(쌍둥 스완넥) =====
RW_PYL = [[-158, 55.0], [-190, 58.0], [-212.5, 63.0]];  // (y, z), x=±5.4
RW_PYL_X = 5.4;  RW_PYL_OD = 8;

// ===== 17 미러 =====
MIR_BASE = [14, 63, 46.0];  MIR_HOUSE = [31, 66, 56.5];

// ===== 18 헬멧 =====
HELM_C = [0, 0, 55];  HELM_R = 11.5;
HELM_SC = [1, 1.18, 1.02];

// ===== 19 콕핏 트림 =====
SEAT_SEC  = [[30, 0, 26, 13.2, 36.75, 3], [-10, 0, 26, 13.2, 36.75, 3]];
HREST_SEC = [[12, 0, 32, 15, 53.5, 5], [-20, 0, 32, 15, 53.5, 5]];

// ===== 20 스티어링 휠 =====
SW_C = [0, 40, 47];  SW_TILT = 20;

// ===== 21/22 서스펜션 (픽업=[x, y, z], 암 끝은 업라이트 내부) =====
FUP = [61, 183, 46];  FLO_BALL = [61.5, 181, 24];  FTR = [61.5, 177, 35];
FPU = [61.5, 180, 27];
F_ARM = [   // [픽업, 볼]
    [[12.0, 206, 20.0], FUP],  [[16.0, 152, 23.0], FUP],
    [[11.9, 208,  9.3], FLO_BALL], [[16.3, 150, 12.0], FLO_BALL],
    [[15.6, 162, 14.0], FTR]];
F_PUSH = [[11.8, 198, 24.4], FPU];
RUP = [53.5, -182, 46];  RLO = [54, -179, 23];  RDRIVE_O = [52, -180, 31];
R_ARM = [
    [[13.3, -160, 47.0], RUP], [[13.3, -198, 45.0], RUP],
    [[12.8, -158, 20.4], RLO], [[9.2, -202, 19.6], RLO]];
R_PULL = [[12.6, -177, 23.75], [53.5, -181, 44]];
R_DRIVE = [[13.2, -180, 17.0], RDRIVE_O];

// ===== 23/24 브레이크 스쿱 =====
SCOOP_F = [[164.2, 59.5, 7, 11, 30, 3], [158, 58.5, 5.5, 8, 28.5, 2.5]];
SCOOP_R = [[-164.2, 48, 7, 10, 29, 3], [-158, 46, 5, 7.5, 27.5, 2.5]];

// ===== 25~28 타이어/림 =====
TIRE_BEAD = 2.6;   // 비드 안쪽 세팅 (단면 반경 23.4)

// ===== 29 기어박스 + 리어 크래시 =====
GEAR_SEC = [
    [-258,   0,  4,  1.8, 15.00, 1.5], [-252, 0,  6,  1.6, 16.30, 2],
    [-230,   0,  9,  1.4, 18.30, 3],   [-208, 0, 12,  4.9, 15.05, 4],
    [-195,   0, 16,  9.35, 14.83, 5],   [-170, 0, 20, 15.1, 15.45, 6],
    [-145,   0, 22, 15.95, 13.60, 7],  [-117.85, 0, 26, 8.6,  9.95, 8]];
GEAR_TOWER = [-200, -158, 8, 11.3, 28, 50];  // y1,y0,x내측,x외측,z0,z1
RAIN_LT = [-258.6, 5, 4];   // y면, w, h

// ===== 30 카메라/안테나 =====
TCAM_Y = -45;  TCAM_Z0 = 84.8;
SIDECAM = [[194, 19.0], [202, 18.5]];  // (y, z) — x는 노우즈 반폭+0.15
ANT = [[4, 70], [-4, 70]];             // (x, y) — chassis 탑
// main file
// 20 스티어링 휠 — 틸트 플레이트 + 그립 + 스티어링 컬럼
include <../params.scad>
use <../lib.scad>

module steering_wheel() {
    translate(SW_C) rotate([SW_TILT, 0, 0]) {
        rotate([90, 0, 0]) linear_extrude(2.2, center = true)
            polygon(rrpts(17, 9, 2));                        // 림 플레이트
        for (s = [-1, 1]) translate([s * 8.2, 0, 0])
            cylinder(r = 1.8, h = 9, center = true, $fn = 24);  // 그립
    }
    rod([0, 41.5, 47.2], [0, 52, 32.2], 4, 32);   // 컬럼 → 콕핏 트러프 바닥
}

steering_wheel();
